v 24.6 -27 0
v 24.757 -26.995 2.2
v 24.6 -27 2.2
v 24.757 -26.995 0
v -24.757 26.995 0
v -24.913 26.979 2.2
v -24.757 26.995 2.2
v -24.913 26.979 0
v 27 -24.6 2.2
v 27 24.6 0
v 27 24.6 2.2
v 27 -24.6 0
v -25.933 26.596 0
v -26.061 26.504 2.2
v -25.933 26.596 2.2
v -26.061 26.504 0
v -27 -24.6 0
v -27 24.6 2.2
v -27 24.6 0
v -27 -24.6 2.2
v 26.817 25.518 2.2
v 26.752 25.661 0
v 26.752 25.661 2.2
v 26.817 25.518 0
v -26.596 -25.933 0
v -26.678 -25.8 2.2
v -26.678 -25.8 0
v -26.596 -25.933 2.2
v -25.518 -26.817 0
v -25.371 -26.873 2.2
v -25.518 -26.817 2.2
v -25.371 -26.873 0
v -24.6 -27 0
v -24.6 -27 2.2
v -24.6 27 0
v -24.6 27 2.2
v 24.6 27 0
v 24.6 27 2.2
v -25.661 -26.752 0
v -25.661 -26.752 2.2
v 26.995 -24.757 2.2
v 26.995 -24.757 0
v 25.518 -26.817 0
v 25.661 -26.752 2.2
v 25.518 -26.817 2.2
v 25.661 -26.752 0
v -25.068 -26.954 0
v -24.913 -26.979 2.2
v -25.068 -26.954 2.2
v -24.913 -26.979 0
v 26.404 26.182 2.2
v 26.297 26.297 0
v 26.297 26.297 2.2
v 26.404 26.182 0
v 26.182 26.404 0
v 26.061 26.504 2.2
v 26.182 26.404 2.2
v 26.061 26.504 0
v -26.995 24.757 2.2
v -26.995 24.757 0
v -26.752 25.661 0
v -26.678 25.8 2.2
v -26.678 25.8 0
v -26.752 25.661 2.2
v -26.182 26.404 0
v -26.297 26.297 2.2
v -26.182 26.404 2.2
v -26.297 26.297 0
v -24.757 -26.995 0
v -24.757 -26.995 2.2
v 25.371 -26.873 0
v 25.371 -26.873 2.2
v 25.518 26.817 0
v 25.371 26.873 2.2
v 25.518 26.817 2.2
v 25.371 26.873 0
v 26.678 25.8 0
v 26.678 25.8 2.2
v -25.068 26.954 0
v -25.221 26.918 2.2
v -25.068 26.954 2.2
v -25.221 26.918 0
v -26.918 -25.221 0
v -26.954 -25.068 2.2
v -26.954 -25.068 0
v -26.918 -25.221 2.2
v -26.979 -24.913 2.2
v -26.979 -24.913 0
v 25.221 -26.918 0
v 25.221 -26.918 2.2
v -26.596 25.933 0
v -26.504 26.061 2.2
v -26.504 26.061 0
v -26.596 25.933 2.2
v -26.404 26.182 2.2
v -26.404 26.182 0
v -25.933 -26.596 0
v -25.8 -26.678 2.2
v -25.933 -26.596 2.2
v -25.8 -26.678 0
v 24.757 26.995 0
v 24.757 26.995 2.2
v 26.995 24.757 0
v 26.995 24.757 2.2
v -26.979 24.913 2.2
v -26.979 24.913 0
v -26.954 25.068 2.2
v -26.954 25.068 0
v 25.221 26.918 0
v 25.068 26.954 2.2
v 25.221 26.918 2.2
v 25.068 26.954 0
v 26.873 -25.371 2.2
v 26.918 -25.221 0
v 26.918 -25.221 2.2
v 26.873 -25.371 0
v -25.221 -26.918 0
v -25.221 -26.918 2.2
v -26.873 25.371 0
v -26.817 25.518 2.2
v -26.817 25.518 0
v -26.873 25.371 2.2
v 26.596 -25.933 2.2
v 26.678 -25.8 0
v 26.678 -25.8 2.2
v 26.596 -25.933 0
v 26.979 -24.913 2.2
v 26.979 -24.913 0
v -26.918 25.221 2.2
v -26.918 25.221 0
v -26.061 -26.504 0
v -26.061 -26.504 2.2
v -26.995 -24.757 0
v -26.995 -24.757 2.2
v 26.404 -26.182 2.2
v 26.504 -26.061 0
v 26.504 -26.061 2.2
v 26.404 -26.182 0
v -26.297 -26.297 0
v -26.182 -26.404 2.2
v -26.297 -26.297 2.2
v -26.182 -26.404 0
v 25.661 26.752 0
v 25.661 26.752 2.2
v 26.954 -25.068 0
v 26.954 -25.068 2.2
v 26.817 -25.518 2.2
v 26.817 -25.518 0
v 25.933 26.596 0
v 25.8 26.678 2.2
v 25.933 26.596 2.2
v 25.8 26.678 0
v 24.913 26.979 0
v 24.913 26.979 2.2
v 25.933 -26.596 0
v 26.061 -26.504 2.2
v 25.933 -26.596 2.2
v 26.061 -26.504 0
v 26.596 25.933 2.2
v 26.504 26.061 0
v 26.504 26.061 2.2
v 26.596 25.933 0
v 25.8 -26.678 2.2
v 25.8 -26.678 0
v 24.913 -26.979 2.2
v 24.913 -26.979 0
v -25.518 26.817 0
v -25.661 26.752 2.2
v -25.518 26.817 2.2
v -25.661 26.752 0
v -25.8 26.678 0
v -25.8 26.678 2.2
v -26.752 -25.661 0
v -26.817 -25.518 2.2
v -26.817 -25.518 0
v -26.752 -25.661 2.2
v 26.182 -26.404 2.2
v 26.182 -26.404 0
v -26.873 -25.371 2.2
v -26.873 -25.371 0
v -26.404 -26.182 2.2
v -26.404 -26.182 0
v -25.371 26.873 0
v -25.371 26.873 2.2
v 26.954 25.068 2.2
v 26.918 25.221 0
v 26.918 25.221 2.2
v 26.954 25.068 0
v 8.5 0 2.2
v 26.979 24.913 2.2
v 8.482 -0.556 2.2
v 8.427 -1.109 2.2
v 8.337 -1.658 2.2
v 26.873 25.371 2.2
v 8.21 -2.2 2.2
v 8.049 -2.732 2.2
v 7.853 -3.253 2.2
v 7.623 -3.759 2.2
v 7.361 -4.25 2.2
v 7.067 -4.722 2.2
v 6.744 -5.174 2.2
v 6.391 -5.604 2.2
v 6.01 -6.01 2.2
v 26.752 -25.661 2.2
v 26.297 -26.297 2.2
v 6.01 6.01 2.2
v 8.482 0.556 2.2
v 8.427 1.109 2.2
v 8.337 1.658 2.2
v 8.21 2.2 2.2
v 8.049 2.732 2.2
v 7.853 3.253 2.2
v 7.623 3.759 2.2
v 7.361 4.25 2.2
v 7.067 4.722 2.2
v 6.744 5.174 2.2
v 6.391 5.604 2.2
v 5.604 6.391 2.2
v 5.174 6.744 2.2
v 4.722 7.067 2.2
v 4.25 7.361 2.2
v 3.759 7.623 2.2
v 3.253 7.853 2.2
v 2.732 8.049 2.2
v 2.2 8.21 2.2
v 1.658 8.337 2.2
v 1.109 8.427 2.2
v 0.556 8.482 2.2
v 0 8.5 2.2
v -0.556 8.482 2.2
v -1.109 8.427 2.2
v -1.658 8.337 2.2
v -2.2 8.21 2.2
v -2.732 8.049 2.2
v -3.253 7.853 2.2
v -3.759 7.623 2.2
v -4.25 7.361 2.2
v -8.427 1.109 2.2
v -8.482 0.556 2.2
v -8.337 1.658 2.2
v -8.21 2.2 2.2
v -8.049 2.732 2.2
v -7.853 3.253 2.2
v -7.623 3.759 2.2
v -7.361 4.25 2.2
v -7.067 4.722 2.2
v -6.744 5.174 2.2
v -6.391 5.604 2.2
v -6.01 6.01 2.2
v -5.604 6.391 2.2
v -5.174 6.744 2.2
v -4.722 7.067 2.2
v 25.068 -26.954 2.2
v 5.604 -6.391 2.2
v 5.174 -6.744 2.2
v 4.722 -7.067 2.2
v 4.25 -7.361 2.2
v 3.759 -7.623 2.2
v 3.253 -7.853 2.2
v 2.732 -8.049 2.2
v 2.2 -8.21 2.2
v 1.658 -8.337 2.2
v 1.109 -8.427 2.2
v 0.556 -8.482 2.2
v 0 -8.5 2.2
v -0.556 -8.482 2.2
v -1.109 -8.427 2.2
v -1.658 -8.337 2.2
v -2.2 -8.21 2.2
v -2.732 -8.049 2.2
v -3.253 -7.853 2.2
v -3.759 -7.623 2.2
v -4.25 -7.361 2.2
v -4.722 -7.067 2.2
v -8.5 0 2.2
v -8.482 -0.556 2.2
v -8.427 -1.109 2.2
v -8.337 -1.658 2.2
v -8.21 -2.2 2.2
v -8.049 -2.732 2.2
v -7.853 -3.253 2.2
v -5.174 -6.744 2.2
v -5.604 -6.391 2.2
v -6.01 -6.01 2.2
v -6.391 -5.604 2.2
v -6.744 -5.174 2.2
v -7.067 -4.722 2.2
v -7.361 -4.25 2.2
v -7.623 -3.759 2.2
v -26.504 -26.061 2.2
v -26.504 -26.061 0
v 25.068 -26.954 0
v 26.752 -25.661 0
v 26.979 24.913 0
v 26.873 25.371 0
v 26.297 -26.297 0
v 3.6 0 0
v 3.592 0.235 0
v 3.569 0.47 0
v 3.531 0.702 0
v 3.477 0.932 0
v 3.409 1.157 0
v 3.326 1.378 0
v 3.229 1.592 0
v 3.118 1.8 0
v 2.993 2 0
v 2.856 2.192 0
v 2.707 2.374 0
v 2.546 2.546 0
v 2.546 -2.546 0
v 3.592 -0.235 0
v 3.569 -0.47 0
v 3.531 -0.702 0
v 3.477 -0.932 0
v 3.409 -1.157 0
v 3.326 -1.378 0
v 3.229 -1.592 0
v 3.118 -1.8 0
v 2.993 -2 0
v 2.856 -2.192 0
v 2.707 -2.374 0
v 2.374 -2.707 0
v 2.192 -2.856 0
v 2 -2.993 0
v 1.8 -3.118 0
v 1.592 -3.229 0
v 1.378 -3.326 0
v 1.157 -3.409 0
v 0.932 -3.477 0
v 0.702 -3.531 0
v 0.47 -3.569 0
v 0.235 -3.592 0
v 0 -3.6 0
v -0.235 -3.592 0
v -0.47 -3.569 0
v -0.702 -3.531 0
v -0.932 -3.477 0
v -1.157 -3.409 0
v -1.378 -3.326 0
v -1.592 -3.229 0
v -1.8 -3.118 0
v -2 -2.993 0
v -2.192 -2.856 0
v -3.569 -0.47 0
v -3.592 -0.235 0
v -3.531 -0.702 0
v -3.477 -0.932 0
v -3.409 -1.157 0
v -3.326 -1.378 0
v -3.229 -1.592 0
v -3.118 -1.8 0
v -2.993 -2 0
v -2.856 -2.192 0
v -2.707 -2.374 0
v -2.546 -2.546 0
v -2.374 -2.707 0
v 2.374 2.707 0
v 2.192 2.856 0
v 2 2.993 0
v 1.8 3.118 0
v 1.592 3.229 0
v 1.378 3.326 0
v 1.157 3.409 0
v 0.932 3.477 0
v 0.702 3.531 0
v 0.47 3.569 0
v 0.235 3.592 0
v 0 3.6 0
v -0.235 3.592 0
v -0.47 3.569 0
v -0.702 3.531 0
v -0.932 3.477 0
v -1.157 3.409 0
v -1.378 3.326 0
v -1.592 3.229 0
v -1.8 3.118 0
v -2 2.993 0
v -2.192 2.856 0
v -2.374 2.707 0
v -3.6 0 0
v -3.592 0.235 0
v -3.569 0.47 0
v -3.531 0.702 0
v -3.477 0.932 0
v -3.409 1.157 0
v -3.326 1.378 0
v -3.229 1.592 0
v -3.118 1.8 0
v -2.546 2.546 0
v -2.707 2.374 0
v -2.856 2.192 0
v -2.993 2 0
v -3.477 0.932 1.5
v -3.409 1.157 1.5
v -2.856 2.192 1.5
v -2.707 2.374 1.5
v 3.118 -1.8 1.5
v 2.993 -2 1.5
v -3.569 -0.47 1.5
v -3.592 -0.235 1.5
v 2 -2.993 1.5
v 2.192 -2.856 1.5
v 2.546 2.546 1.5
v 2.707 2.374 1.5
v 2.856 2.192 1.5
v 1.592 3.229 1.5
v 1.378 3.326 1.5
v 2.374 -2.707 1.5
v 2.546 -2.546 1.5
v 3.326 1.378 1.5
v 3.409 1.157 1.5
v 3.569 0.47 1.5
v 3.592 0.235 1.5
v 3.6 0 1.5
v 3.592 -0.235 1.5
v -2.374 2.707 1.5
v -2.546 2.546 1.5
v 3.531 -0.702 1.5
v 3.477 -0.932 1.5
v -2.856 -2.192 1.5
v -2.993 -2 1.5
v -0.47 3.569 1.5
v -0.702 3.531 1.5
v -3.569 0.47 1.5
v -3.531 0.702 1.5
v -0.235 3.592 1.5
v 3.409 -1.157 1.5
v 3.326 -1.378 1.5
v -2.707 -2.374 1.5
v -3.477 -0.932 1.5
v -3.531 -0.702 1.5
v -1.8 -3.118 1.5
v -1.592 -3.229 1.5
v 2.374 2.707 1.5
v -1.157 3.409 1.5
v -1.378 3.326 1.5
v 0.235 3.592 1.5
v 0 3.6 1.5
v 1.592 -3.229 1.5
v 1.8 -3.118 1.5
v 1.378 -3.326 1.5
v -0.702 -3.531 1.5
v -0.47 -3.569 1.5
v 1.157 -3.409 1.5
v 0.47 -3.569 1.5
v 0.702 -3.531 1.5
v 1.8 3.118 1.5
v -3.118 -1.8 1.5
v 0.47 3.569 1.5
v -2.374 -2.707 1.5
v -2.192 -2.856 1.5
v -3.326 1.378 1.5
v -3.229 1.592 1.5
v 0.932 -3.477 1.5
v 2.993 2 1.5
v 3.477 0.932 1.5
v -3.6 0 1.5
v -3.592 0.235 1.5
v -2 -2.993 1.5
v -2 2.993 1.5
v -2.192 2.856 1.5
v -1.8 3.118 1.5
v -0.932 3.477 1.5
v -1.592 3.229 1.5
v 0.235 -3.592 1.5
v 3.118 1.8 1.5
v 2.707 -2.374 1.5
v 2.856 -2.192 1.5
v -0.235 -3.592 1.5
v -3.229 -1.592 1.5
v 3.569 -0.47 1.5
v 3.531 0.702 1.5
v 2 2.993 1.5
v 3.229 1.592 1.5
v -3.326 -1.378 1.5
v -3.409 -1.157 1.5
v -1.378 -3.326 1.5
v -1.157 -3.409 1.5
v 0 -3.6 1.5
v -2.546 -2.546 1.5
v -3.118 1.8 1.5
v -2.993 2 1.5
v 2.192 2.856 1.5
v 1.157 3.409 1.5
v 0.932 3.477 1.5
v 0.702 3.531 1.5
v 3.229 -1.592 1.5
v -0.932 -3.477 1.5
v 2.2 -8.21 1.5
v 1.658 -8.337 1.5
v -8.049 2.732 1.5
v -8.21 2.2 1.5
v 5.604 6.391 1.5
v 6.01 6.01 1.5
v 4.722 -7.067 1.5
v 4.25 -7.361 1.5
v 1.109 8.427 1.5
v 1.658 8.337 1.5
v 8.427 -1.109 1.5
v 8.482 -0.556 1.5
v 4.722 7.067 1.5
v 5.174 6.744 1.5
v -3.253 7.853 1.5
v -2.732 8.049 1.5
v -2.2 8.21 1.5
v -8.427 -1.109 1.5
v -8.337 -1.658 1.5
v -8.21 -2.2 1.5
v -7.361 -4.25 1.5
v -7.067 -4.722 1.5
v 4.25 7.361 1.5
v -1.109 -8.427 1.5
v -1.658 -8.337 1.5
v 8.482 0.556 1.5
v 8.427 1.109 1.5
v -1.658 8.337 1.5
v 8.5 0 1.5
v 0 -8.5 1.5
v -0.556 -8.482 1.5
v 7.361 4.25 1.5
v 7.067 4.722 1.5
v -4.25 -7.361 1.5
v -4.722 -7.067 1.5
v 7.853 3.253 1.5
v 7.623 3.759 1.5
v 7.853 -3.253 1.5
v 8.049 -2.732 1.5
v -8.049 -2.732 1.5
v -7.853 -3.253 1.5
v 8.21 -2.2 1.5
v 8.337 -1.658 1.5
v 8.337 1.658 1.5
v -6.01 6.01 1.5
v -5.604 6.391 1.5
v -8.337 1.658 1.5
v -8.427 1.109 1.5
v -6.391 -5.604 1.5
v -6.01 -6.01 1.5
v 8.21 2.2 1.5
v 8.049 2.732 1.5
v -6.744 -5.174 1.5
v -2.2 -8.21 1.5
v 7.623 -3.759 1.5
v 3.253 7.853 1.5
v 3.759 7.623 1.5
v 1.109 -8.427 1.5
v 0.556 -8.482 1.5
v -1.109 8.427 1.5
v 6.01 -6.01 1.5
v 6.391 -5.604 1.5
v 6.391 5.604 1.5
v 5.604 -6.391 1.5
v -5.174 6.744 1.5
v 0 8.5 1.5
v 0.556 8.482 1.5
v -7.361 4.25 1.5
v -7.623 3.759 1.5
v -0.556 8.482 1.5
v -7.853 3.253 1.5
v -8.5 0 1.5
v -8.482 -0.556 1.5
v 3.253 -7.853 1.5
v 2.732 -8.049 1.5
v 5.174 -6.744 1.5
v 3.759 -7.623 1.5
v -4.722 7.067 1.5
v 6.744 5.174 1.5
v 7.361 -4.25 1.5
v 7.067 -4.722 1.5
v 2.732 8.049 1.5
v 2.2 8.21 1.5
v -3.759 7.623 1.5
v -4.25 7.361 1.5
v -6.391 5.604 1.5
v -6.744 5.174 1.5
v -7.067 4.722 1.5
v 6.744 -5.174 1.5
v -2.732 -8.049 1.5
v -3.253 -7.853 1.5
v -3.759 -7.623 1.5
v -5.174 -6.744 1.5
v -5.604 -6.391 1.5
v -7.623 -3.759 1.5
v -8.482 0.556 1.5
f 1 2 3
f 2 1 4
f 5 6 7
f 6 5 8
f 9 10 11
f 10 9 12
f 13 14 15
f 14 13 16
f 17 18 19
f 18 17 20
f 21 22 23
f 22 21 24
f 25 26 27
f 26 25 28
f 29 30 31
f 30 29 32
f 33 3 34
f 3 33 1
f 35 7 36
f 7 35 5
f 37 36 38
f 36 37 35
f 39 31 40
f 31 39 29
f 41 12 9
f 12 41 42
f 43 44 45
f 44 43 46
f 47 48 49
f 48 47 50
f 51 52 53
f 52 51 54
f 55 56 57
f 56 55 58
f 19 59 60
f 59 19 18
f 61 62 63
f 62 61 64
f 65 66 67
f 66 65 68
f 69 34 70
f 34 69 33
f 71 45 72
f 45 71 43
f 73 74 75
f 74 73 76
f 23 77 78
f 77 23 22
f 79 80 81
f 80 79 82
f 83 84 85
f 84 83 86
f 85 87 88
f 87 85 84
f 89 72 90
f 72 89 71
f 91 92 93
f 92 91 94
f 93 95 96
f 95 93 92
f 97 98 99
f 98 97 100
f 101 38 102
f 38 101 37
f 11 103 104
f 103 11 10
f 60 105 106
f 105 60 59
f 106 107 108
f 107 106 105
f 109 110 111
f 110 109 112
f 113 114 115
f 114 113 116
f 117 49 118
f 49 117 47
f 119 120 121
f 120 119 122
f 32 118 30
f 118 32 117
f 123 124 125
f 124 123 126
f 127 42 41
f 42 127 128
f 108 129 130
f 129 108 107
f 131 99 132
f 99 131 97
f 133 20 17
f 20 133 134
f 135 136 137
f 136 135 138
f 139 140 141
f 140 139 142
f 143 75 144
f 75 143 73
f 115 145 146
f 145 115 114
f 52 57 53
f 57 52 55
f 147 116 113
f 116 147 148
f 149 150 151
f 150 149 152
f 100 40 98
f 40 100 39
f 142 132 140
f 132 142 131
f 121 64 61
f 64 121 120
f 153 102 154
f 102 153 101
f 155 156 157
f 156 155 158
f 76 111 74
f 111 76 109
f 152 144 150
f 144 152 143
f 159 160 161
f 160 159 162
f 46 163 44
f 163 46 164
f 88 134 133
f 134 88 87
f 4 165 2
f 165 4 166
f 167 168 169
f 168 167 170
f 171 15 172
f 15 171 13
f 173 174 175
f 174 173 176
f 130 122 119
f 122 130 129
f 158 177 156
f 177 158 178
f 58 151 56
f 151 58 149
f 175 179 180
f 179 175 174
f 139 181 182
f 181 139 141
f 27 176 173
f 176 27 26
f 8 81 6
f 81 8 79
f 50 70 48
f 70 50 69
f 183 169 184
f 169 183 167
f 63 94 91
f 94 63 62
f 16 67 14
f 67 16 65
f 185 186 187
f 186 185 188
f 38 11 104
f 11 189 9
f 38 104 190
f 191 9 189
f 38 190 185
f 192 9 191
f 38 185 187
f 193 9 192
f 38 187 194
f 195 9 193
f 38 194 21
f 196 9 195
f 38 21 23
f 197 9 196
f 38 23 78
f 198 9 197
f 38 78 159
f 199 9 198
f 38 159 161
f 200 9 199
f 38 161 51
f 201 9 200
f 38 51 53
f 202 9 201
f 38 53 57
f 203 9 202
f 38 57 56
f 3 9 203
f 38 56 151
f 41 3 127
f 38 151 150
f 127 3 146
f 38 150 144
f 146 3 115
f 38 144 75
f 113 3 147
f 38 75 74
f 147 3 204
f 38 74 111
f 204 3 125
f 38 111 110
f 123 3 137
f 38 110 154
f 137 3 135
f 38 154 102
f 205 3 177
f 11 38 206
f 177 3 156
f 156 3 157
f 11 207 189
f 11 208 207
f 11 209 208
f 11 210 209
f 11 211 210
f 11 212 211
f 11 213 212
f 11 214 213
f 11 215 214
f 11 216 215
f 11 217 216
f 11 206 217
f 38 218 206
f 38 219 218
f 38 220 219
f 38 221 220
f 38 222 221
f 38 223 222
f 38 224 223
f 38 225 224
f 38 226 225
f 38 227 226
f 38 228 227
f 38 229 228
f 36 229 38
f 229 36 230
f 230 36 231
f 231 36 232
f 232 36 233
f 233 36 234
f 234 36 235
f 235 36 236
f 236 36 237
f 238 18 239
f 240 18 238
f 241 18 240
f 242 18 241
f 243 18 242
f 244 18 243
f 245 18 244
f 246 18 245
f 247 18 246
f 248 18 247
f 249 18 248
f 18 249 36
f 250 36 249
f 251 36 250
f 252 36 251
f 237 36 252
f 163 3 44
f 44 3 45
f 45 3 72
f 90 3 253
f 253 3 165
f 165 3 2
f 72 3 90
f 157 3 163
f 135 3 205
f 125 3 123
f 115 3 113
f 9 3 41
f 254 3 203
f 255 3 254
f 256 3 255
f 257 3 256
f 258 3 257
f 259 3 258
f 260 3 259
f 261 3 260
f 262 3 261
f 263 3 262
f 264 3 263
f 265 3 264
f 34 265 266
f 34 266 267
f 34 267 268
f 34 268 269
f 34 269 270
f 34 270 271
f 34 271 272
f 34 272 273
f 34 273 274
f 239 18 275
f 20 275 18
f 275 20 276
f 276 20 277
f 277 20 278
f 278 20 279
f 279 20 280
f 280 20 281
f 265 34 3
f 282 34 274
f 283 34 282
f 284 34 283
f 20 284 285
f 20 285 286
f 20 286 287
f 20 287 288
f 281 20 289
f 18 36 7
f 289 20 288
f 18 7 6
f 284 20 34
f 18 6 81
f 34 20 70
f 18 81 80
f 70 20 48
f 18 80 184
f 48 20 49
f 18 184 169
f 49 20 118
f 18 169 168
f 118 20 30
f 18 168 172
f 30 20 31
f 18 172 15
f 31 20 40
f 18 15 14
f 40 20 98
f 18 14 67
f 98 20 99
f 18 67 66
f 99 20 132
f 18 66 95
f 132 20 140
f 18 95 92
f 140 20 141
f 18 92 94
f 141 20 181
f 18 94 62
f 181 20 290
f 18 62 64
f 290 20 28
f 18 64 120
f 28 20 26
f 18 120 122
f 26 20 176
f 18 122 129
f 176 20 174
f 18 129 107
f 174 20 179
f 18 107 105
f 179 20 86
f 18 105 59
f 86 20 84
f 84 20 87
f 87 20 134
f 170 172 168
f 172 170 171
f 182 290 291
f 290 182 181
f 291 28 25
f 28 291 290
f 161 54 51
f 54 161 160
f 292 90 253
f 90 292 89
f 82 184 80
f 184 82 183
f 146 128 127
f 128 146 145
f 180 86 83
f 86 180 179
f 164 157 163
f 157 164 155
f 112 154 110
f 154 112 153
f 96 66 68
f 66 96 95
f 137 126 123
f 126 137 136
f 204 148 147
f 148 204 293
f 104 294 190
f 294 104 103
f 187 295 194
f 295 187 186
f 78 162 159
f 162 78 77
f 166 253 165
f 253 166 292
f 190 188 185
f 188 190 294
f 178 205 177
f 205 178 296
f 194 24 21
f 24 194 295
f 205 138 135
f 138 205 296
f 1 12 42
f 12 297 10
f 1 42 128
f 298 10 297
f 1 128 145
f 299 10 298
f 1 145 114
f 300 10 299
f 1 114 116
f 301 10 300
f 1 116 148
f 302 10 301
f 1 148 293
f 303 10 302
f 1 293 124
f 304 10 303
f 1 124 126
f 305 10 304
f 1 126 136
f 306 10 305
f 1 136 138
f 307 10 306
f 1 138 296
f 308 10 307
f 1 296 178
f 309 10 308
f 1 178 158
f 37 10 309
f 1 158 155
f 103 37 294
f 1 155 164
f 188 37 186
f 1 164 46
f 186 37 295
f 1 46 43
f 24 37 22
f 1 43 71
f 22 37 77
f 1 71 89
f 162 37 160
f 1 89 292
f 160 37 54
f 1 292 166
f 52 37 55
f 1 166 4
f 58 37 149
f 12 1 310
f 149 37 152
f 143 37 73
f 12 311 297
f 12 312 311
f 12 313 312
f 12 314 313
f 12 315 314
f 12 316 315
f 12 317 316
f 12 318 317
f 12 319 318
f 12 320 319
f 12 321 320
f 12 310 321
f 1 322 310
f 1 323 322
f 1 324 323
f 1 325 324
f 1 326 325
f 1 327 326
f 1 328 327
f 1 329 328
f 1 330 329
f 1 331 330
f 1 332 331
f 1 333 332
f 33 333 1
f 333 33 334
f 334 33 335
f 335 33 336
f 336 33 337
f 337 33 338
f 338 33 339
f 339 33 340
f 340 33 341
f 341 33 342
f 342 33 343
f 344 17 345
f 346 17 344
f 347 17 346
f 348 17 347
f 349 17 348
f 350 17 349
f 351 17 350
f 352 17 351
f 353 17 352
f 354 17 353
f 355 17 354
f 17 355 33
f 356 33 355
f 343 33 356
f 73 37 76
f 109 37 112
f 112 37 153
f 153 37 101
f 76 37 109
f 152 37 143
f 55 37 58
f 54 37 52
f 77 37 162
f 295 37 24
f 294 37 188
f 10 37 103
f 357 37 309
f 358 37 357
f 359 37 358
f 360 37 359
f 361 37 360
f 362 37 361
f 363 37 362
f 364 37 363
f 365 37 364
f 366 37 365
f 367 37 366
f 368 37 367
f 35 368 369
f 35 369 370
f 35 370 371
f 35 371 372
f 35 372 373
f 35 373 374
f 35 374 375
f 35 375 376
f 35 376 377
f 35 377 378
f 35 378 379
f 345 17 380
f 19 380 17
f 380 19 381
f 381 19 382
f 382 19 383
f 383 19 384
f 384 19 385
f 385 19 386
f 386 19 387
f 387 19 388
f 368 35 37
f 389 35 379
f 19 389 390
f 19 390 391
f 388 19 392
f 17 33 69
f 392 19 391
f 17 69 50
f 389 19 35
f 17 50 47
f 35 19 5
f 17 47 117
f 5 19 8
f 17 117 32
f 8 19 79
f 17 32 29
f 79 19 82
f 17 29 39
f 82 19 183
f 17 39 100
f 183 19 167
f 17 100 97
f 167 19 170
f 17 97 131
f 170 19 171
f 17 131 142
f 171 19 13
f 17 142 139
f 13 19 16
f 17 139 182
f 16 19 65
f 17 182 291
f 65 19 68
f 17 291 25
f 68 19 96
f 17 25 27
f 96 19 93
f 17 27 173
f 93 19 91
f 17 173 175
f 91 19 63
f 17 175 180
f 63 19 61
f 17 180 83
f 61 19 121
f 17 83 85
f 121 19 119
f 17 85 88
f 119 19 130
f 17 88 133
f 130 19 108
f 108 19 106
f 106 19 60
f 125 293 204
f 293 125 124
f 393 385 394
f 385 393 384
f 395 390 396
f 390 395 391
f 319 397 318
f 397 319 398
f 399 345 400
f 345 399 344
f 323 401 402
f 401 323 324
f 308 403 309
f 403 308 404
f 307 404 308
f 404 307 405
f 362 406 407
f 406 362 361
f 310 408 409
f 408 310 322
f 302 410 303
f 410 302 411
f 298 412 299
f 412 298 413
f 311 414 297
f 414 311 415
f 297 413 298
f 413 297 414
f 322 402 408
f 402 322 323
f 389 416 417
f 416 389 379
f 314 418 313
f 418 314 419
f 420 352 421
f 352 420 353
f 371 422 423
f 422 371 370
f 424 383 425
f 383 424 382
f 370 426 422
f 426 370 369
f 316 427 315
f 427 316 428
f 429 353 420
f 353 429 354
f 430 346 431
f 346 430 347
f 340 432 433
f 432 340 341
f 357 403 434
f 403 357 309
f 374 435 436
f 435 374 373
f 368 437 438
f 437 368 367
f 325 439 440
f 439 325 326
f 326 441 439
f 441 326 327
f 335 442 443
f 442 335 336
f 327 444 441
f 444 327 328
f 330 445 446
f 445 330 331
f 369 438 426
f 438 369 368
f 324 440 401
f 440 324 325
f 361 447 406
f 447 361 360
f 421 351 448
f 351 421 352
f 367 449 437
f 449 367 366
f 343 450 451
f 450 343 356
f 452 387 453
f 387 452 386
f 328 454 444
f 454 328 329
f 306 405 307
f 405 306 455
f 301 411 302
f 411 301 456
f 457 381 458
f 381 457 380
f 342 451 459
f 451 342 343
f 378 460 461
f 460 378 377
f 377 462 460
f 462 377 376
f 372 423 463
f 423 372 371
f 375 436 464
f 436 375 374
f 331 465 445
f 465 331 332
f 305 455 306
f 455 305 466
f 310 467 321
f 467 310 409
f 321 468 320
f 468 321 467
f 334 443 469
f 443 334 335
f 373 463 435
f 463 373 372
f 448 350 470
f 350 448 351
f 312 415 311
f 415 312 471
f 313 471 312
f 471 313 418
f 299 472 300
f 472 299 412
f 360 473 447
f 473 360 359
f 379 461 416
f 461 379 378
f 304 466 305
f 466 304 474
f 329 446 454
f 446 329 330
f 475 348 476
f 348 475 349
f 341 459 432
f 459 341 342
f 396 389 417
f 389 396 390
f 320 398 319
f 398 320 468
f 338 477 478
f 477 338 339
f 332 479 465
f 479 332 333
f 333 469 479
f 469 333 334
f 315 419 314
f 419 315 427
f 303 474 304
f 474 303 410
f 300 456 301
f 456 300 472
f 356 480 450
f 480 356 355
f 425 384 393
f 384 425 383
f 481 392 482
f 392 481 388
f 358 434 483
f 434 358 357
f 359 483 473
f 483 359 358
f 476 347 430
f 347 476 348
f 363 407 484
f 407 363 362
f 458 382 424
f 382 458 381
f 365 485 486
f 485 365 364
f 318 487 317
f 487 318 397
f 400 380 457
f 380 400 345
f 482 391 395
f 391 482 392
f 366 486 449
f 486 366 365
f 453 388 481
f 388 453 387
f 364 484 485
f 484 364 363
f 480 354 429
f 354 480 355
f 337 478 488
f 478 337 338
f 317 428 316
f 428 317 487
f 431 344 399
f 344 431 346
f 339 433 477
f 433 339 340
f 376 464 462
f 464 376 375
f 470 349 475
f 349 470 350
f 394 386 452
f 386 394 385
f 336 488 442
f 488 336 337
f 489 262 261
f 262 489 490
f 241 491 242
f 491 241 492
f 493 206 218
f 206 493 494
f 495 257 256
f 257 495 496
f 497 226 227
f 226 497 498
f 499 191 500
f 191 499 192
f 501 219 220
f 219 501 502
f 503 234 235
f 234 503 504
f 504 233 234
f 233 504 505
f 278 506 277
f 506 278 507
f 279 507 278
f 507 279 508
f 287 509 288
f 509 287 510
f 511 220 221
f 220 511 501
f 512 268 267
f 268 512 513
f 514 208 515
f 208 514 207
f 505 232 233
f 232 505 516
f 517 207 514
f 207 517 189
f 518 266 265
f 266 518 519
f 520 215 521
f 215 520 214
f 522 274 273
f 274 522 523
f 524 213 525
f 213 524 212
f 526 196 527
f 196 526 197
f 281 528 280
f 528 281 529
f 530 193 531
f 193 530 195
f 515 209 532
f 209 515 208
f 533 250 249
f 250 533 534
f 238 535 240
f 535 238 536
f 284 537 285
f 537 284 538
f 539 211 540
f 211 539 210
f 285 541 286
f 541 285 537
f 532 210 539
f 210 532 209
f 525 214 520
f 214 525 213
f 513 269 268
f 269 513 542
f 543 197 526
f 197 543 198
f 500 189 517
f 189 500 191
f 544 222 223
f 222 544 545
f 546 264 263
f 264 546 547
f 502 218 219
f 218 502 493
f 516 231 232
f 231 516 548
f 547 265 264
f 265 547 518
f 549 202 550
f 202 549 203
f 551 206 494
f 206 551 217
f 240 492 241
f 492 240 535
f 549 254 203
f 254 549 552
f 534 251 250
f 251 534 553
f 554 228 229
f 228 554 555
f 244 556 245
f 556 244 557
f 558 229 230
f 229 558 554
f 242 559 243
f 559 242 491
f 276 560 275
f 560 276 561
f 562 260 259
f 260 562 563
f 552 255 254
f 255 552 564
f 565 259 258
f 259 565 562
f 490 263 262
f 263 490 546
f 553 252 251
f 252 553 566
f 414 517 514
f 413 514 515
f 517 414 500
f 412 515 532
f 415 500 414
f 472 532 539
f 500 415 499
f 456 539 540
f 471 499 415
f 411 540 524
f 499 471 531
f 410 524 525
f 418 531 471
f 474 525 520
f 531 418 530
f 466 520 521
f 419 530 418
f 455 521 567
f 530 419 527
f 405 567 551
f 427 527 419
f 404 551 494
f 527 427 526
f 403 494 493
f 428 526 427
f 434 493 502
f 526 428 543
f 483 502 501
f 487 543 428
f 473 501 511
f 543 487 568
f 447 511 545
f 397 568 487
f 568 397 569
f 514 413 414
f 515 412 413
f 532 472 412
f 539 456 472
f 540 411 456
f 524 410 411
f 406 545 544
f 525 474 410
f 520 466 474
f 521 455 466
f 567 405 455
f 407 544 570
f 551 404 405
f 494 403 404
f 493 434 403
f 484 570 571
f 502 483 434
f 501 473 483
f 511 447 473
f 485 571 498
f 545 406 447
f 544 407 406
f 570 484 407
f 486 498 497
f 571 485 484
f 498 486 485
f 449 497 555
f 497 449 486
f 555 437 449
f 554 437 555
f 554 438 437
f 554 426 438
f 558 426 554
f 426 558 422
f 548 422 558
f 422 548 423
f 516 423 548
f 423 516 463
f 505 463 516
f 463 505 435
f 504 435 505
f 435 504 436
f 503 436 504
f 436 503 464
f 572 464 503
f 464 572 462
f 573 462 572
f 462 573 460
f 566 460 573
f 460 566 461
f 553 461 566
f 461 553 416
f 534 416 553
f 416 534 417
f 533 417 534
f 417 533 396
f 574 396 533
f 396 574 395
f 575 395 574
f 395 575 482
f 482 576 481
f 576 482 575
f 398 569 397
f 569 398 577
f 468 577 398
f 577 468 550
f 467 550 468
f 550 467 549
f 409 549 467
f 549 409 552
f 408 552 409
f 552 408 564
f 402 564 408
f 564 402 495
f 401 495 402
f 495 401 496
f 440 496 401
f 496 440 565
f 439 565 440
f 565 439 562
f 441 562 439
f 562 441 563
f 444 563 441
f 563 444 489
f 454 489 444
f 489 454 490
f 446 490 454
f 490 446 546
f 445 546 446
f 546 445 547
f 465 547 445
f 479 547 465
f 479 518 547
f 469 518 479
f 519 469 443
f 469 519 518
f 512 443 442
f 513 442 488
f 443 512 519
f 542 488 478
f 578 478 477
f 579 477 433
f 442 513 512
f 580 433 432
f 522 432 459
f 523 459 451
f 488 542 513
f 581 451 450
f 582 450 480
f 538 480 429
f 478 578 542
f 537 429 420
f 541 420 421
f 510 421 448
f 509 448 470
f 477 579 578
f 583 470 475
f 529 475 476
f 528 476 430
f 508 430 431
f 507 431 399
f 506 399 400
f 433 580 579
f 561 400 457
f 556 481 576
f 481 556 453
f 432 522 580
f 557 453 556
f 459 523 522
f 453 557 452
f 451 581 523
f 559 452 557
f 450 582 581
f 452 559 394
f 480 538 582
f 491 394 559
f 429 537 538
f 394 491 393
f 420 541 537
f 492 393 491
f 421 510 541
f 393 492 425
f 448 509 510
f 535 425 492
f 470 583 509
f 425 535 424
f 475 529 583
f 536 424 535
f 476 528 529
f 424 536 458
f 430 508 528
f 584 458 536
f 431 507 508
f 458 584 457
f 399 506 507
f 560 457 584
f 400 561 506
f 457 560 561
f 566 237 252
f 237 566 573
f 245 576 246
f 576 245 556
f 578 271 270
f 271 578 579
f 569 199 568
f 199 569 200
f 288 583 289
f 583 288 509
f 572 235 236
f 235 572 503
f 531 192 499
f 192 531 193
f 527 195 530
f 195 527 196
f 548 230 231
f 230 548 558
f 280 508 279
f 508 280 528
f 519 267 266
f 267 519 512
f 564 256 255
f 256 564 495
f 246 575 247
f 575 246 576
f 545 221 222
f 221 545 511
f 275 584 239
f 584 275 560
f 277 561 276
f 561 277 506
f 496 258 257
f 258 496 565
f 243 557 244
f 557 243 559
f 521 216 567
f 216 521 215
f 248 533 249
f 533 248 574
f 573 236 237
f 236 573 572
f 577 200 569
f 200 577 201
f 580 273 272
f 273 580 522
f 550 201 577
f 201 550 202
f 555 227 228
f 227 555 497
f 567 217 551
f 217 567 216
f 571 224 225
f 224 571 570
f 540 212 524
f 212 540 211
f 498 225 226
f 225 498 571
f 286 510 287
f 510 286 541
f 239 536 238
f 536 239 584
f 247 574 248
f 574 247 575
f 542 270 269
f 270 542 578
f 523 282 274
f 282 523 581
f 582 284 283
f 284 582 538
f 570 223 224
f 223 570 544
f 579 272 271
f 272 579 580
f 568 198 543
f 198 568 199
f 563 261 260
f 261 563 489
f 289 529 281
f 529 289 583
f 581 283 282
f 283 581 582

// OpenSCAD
// WallKnob-C6 Rev A - Busch-Jaeger Reflex SI compatible center plate
// Nominal Reflex SI cover size: 54 x 54 mm. Verify against your physical frame.
$fn=96;
plate=54;
th=2.2;
corner_r=2.4;
shaft_hole=7.2;
recess_d=17.0;
recess_depth=0.7;

module rounded_square(size,r,h){
  linear_extrude(height=h)
    offset(r=r) square([size-2*r,size-2*r],center=true);
}

difference(){
  rounded_square(plate,corner_r,th);
  translate([0,0,-0.1]) cylinder(d=shaft_hole,h=th+0.2);
  translate([0,0,th-recess_depth]) cylinder(d=recess_d,h=recess_depth+0.1);
}
